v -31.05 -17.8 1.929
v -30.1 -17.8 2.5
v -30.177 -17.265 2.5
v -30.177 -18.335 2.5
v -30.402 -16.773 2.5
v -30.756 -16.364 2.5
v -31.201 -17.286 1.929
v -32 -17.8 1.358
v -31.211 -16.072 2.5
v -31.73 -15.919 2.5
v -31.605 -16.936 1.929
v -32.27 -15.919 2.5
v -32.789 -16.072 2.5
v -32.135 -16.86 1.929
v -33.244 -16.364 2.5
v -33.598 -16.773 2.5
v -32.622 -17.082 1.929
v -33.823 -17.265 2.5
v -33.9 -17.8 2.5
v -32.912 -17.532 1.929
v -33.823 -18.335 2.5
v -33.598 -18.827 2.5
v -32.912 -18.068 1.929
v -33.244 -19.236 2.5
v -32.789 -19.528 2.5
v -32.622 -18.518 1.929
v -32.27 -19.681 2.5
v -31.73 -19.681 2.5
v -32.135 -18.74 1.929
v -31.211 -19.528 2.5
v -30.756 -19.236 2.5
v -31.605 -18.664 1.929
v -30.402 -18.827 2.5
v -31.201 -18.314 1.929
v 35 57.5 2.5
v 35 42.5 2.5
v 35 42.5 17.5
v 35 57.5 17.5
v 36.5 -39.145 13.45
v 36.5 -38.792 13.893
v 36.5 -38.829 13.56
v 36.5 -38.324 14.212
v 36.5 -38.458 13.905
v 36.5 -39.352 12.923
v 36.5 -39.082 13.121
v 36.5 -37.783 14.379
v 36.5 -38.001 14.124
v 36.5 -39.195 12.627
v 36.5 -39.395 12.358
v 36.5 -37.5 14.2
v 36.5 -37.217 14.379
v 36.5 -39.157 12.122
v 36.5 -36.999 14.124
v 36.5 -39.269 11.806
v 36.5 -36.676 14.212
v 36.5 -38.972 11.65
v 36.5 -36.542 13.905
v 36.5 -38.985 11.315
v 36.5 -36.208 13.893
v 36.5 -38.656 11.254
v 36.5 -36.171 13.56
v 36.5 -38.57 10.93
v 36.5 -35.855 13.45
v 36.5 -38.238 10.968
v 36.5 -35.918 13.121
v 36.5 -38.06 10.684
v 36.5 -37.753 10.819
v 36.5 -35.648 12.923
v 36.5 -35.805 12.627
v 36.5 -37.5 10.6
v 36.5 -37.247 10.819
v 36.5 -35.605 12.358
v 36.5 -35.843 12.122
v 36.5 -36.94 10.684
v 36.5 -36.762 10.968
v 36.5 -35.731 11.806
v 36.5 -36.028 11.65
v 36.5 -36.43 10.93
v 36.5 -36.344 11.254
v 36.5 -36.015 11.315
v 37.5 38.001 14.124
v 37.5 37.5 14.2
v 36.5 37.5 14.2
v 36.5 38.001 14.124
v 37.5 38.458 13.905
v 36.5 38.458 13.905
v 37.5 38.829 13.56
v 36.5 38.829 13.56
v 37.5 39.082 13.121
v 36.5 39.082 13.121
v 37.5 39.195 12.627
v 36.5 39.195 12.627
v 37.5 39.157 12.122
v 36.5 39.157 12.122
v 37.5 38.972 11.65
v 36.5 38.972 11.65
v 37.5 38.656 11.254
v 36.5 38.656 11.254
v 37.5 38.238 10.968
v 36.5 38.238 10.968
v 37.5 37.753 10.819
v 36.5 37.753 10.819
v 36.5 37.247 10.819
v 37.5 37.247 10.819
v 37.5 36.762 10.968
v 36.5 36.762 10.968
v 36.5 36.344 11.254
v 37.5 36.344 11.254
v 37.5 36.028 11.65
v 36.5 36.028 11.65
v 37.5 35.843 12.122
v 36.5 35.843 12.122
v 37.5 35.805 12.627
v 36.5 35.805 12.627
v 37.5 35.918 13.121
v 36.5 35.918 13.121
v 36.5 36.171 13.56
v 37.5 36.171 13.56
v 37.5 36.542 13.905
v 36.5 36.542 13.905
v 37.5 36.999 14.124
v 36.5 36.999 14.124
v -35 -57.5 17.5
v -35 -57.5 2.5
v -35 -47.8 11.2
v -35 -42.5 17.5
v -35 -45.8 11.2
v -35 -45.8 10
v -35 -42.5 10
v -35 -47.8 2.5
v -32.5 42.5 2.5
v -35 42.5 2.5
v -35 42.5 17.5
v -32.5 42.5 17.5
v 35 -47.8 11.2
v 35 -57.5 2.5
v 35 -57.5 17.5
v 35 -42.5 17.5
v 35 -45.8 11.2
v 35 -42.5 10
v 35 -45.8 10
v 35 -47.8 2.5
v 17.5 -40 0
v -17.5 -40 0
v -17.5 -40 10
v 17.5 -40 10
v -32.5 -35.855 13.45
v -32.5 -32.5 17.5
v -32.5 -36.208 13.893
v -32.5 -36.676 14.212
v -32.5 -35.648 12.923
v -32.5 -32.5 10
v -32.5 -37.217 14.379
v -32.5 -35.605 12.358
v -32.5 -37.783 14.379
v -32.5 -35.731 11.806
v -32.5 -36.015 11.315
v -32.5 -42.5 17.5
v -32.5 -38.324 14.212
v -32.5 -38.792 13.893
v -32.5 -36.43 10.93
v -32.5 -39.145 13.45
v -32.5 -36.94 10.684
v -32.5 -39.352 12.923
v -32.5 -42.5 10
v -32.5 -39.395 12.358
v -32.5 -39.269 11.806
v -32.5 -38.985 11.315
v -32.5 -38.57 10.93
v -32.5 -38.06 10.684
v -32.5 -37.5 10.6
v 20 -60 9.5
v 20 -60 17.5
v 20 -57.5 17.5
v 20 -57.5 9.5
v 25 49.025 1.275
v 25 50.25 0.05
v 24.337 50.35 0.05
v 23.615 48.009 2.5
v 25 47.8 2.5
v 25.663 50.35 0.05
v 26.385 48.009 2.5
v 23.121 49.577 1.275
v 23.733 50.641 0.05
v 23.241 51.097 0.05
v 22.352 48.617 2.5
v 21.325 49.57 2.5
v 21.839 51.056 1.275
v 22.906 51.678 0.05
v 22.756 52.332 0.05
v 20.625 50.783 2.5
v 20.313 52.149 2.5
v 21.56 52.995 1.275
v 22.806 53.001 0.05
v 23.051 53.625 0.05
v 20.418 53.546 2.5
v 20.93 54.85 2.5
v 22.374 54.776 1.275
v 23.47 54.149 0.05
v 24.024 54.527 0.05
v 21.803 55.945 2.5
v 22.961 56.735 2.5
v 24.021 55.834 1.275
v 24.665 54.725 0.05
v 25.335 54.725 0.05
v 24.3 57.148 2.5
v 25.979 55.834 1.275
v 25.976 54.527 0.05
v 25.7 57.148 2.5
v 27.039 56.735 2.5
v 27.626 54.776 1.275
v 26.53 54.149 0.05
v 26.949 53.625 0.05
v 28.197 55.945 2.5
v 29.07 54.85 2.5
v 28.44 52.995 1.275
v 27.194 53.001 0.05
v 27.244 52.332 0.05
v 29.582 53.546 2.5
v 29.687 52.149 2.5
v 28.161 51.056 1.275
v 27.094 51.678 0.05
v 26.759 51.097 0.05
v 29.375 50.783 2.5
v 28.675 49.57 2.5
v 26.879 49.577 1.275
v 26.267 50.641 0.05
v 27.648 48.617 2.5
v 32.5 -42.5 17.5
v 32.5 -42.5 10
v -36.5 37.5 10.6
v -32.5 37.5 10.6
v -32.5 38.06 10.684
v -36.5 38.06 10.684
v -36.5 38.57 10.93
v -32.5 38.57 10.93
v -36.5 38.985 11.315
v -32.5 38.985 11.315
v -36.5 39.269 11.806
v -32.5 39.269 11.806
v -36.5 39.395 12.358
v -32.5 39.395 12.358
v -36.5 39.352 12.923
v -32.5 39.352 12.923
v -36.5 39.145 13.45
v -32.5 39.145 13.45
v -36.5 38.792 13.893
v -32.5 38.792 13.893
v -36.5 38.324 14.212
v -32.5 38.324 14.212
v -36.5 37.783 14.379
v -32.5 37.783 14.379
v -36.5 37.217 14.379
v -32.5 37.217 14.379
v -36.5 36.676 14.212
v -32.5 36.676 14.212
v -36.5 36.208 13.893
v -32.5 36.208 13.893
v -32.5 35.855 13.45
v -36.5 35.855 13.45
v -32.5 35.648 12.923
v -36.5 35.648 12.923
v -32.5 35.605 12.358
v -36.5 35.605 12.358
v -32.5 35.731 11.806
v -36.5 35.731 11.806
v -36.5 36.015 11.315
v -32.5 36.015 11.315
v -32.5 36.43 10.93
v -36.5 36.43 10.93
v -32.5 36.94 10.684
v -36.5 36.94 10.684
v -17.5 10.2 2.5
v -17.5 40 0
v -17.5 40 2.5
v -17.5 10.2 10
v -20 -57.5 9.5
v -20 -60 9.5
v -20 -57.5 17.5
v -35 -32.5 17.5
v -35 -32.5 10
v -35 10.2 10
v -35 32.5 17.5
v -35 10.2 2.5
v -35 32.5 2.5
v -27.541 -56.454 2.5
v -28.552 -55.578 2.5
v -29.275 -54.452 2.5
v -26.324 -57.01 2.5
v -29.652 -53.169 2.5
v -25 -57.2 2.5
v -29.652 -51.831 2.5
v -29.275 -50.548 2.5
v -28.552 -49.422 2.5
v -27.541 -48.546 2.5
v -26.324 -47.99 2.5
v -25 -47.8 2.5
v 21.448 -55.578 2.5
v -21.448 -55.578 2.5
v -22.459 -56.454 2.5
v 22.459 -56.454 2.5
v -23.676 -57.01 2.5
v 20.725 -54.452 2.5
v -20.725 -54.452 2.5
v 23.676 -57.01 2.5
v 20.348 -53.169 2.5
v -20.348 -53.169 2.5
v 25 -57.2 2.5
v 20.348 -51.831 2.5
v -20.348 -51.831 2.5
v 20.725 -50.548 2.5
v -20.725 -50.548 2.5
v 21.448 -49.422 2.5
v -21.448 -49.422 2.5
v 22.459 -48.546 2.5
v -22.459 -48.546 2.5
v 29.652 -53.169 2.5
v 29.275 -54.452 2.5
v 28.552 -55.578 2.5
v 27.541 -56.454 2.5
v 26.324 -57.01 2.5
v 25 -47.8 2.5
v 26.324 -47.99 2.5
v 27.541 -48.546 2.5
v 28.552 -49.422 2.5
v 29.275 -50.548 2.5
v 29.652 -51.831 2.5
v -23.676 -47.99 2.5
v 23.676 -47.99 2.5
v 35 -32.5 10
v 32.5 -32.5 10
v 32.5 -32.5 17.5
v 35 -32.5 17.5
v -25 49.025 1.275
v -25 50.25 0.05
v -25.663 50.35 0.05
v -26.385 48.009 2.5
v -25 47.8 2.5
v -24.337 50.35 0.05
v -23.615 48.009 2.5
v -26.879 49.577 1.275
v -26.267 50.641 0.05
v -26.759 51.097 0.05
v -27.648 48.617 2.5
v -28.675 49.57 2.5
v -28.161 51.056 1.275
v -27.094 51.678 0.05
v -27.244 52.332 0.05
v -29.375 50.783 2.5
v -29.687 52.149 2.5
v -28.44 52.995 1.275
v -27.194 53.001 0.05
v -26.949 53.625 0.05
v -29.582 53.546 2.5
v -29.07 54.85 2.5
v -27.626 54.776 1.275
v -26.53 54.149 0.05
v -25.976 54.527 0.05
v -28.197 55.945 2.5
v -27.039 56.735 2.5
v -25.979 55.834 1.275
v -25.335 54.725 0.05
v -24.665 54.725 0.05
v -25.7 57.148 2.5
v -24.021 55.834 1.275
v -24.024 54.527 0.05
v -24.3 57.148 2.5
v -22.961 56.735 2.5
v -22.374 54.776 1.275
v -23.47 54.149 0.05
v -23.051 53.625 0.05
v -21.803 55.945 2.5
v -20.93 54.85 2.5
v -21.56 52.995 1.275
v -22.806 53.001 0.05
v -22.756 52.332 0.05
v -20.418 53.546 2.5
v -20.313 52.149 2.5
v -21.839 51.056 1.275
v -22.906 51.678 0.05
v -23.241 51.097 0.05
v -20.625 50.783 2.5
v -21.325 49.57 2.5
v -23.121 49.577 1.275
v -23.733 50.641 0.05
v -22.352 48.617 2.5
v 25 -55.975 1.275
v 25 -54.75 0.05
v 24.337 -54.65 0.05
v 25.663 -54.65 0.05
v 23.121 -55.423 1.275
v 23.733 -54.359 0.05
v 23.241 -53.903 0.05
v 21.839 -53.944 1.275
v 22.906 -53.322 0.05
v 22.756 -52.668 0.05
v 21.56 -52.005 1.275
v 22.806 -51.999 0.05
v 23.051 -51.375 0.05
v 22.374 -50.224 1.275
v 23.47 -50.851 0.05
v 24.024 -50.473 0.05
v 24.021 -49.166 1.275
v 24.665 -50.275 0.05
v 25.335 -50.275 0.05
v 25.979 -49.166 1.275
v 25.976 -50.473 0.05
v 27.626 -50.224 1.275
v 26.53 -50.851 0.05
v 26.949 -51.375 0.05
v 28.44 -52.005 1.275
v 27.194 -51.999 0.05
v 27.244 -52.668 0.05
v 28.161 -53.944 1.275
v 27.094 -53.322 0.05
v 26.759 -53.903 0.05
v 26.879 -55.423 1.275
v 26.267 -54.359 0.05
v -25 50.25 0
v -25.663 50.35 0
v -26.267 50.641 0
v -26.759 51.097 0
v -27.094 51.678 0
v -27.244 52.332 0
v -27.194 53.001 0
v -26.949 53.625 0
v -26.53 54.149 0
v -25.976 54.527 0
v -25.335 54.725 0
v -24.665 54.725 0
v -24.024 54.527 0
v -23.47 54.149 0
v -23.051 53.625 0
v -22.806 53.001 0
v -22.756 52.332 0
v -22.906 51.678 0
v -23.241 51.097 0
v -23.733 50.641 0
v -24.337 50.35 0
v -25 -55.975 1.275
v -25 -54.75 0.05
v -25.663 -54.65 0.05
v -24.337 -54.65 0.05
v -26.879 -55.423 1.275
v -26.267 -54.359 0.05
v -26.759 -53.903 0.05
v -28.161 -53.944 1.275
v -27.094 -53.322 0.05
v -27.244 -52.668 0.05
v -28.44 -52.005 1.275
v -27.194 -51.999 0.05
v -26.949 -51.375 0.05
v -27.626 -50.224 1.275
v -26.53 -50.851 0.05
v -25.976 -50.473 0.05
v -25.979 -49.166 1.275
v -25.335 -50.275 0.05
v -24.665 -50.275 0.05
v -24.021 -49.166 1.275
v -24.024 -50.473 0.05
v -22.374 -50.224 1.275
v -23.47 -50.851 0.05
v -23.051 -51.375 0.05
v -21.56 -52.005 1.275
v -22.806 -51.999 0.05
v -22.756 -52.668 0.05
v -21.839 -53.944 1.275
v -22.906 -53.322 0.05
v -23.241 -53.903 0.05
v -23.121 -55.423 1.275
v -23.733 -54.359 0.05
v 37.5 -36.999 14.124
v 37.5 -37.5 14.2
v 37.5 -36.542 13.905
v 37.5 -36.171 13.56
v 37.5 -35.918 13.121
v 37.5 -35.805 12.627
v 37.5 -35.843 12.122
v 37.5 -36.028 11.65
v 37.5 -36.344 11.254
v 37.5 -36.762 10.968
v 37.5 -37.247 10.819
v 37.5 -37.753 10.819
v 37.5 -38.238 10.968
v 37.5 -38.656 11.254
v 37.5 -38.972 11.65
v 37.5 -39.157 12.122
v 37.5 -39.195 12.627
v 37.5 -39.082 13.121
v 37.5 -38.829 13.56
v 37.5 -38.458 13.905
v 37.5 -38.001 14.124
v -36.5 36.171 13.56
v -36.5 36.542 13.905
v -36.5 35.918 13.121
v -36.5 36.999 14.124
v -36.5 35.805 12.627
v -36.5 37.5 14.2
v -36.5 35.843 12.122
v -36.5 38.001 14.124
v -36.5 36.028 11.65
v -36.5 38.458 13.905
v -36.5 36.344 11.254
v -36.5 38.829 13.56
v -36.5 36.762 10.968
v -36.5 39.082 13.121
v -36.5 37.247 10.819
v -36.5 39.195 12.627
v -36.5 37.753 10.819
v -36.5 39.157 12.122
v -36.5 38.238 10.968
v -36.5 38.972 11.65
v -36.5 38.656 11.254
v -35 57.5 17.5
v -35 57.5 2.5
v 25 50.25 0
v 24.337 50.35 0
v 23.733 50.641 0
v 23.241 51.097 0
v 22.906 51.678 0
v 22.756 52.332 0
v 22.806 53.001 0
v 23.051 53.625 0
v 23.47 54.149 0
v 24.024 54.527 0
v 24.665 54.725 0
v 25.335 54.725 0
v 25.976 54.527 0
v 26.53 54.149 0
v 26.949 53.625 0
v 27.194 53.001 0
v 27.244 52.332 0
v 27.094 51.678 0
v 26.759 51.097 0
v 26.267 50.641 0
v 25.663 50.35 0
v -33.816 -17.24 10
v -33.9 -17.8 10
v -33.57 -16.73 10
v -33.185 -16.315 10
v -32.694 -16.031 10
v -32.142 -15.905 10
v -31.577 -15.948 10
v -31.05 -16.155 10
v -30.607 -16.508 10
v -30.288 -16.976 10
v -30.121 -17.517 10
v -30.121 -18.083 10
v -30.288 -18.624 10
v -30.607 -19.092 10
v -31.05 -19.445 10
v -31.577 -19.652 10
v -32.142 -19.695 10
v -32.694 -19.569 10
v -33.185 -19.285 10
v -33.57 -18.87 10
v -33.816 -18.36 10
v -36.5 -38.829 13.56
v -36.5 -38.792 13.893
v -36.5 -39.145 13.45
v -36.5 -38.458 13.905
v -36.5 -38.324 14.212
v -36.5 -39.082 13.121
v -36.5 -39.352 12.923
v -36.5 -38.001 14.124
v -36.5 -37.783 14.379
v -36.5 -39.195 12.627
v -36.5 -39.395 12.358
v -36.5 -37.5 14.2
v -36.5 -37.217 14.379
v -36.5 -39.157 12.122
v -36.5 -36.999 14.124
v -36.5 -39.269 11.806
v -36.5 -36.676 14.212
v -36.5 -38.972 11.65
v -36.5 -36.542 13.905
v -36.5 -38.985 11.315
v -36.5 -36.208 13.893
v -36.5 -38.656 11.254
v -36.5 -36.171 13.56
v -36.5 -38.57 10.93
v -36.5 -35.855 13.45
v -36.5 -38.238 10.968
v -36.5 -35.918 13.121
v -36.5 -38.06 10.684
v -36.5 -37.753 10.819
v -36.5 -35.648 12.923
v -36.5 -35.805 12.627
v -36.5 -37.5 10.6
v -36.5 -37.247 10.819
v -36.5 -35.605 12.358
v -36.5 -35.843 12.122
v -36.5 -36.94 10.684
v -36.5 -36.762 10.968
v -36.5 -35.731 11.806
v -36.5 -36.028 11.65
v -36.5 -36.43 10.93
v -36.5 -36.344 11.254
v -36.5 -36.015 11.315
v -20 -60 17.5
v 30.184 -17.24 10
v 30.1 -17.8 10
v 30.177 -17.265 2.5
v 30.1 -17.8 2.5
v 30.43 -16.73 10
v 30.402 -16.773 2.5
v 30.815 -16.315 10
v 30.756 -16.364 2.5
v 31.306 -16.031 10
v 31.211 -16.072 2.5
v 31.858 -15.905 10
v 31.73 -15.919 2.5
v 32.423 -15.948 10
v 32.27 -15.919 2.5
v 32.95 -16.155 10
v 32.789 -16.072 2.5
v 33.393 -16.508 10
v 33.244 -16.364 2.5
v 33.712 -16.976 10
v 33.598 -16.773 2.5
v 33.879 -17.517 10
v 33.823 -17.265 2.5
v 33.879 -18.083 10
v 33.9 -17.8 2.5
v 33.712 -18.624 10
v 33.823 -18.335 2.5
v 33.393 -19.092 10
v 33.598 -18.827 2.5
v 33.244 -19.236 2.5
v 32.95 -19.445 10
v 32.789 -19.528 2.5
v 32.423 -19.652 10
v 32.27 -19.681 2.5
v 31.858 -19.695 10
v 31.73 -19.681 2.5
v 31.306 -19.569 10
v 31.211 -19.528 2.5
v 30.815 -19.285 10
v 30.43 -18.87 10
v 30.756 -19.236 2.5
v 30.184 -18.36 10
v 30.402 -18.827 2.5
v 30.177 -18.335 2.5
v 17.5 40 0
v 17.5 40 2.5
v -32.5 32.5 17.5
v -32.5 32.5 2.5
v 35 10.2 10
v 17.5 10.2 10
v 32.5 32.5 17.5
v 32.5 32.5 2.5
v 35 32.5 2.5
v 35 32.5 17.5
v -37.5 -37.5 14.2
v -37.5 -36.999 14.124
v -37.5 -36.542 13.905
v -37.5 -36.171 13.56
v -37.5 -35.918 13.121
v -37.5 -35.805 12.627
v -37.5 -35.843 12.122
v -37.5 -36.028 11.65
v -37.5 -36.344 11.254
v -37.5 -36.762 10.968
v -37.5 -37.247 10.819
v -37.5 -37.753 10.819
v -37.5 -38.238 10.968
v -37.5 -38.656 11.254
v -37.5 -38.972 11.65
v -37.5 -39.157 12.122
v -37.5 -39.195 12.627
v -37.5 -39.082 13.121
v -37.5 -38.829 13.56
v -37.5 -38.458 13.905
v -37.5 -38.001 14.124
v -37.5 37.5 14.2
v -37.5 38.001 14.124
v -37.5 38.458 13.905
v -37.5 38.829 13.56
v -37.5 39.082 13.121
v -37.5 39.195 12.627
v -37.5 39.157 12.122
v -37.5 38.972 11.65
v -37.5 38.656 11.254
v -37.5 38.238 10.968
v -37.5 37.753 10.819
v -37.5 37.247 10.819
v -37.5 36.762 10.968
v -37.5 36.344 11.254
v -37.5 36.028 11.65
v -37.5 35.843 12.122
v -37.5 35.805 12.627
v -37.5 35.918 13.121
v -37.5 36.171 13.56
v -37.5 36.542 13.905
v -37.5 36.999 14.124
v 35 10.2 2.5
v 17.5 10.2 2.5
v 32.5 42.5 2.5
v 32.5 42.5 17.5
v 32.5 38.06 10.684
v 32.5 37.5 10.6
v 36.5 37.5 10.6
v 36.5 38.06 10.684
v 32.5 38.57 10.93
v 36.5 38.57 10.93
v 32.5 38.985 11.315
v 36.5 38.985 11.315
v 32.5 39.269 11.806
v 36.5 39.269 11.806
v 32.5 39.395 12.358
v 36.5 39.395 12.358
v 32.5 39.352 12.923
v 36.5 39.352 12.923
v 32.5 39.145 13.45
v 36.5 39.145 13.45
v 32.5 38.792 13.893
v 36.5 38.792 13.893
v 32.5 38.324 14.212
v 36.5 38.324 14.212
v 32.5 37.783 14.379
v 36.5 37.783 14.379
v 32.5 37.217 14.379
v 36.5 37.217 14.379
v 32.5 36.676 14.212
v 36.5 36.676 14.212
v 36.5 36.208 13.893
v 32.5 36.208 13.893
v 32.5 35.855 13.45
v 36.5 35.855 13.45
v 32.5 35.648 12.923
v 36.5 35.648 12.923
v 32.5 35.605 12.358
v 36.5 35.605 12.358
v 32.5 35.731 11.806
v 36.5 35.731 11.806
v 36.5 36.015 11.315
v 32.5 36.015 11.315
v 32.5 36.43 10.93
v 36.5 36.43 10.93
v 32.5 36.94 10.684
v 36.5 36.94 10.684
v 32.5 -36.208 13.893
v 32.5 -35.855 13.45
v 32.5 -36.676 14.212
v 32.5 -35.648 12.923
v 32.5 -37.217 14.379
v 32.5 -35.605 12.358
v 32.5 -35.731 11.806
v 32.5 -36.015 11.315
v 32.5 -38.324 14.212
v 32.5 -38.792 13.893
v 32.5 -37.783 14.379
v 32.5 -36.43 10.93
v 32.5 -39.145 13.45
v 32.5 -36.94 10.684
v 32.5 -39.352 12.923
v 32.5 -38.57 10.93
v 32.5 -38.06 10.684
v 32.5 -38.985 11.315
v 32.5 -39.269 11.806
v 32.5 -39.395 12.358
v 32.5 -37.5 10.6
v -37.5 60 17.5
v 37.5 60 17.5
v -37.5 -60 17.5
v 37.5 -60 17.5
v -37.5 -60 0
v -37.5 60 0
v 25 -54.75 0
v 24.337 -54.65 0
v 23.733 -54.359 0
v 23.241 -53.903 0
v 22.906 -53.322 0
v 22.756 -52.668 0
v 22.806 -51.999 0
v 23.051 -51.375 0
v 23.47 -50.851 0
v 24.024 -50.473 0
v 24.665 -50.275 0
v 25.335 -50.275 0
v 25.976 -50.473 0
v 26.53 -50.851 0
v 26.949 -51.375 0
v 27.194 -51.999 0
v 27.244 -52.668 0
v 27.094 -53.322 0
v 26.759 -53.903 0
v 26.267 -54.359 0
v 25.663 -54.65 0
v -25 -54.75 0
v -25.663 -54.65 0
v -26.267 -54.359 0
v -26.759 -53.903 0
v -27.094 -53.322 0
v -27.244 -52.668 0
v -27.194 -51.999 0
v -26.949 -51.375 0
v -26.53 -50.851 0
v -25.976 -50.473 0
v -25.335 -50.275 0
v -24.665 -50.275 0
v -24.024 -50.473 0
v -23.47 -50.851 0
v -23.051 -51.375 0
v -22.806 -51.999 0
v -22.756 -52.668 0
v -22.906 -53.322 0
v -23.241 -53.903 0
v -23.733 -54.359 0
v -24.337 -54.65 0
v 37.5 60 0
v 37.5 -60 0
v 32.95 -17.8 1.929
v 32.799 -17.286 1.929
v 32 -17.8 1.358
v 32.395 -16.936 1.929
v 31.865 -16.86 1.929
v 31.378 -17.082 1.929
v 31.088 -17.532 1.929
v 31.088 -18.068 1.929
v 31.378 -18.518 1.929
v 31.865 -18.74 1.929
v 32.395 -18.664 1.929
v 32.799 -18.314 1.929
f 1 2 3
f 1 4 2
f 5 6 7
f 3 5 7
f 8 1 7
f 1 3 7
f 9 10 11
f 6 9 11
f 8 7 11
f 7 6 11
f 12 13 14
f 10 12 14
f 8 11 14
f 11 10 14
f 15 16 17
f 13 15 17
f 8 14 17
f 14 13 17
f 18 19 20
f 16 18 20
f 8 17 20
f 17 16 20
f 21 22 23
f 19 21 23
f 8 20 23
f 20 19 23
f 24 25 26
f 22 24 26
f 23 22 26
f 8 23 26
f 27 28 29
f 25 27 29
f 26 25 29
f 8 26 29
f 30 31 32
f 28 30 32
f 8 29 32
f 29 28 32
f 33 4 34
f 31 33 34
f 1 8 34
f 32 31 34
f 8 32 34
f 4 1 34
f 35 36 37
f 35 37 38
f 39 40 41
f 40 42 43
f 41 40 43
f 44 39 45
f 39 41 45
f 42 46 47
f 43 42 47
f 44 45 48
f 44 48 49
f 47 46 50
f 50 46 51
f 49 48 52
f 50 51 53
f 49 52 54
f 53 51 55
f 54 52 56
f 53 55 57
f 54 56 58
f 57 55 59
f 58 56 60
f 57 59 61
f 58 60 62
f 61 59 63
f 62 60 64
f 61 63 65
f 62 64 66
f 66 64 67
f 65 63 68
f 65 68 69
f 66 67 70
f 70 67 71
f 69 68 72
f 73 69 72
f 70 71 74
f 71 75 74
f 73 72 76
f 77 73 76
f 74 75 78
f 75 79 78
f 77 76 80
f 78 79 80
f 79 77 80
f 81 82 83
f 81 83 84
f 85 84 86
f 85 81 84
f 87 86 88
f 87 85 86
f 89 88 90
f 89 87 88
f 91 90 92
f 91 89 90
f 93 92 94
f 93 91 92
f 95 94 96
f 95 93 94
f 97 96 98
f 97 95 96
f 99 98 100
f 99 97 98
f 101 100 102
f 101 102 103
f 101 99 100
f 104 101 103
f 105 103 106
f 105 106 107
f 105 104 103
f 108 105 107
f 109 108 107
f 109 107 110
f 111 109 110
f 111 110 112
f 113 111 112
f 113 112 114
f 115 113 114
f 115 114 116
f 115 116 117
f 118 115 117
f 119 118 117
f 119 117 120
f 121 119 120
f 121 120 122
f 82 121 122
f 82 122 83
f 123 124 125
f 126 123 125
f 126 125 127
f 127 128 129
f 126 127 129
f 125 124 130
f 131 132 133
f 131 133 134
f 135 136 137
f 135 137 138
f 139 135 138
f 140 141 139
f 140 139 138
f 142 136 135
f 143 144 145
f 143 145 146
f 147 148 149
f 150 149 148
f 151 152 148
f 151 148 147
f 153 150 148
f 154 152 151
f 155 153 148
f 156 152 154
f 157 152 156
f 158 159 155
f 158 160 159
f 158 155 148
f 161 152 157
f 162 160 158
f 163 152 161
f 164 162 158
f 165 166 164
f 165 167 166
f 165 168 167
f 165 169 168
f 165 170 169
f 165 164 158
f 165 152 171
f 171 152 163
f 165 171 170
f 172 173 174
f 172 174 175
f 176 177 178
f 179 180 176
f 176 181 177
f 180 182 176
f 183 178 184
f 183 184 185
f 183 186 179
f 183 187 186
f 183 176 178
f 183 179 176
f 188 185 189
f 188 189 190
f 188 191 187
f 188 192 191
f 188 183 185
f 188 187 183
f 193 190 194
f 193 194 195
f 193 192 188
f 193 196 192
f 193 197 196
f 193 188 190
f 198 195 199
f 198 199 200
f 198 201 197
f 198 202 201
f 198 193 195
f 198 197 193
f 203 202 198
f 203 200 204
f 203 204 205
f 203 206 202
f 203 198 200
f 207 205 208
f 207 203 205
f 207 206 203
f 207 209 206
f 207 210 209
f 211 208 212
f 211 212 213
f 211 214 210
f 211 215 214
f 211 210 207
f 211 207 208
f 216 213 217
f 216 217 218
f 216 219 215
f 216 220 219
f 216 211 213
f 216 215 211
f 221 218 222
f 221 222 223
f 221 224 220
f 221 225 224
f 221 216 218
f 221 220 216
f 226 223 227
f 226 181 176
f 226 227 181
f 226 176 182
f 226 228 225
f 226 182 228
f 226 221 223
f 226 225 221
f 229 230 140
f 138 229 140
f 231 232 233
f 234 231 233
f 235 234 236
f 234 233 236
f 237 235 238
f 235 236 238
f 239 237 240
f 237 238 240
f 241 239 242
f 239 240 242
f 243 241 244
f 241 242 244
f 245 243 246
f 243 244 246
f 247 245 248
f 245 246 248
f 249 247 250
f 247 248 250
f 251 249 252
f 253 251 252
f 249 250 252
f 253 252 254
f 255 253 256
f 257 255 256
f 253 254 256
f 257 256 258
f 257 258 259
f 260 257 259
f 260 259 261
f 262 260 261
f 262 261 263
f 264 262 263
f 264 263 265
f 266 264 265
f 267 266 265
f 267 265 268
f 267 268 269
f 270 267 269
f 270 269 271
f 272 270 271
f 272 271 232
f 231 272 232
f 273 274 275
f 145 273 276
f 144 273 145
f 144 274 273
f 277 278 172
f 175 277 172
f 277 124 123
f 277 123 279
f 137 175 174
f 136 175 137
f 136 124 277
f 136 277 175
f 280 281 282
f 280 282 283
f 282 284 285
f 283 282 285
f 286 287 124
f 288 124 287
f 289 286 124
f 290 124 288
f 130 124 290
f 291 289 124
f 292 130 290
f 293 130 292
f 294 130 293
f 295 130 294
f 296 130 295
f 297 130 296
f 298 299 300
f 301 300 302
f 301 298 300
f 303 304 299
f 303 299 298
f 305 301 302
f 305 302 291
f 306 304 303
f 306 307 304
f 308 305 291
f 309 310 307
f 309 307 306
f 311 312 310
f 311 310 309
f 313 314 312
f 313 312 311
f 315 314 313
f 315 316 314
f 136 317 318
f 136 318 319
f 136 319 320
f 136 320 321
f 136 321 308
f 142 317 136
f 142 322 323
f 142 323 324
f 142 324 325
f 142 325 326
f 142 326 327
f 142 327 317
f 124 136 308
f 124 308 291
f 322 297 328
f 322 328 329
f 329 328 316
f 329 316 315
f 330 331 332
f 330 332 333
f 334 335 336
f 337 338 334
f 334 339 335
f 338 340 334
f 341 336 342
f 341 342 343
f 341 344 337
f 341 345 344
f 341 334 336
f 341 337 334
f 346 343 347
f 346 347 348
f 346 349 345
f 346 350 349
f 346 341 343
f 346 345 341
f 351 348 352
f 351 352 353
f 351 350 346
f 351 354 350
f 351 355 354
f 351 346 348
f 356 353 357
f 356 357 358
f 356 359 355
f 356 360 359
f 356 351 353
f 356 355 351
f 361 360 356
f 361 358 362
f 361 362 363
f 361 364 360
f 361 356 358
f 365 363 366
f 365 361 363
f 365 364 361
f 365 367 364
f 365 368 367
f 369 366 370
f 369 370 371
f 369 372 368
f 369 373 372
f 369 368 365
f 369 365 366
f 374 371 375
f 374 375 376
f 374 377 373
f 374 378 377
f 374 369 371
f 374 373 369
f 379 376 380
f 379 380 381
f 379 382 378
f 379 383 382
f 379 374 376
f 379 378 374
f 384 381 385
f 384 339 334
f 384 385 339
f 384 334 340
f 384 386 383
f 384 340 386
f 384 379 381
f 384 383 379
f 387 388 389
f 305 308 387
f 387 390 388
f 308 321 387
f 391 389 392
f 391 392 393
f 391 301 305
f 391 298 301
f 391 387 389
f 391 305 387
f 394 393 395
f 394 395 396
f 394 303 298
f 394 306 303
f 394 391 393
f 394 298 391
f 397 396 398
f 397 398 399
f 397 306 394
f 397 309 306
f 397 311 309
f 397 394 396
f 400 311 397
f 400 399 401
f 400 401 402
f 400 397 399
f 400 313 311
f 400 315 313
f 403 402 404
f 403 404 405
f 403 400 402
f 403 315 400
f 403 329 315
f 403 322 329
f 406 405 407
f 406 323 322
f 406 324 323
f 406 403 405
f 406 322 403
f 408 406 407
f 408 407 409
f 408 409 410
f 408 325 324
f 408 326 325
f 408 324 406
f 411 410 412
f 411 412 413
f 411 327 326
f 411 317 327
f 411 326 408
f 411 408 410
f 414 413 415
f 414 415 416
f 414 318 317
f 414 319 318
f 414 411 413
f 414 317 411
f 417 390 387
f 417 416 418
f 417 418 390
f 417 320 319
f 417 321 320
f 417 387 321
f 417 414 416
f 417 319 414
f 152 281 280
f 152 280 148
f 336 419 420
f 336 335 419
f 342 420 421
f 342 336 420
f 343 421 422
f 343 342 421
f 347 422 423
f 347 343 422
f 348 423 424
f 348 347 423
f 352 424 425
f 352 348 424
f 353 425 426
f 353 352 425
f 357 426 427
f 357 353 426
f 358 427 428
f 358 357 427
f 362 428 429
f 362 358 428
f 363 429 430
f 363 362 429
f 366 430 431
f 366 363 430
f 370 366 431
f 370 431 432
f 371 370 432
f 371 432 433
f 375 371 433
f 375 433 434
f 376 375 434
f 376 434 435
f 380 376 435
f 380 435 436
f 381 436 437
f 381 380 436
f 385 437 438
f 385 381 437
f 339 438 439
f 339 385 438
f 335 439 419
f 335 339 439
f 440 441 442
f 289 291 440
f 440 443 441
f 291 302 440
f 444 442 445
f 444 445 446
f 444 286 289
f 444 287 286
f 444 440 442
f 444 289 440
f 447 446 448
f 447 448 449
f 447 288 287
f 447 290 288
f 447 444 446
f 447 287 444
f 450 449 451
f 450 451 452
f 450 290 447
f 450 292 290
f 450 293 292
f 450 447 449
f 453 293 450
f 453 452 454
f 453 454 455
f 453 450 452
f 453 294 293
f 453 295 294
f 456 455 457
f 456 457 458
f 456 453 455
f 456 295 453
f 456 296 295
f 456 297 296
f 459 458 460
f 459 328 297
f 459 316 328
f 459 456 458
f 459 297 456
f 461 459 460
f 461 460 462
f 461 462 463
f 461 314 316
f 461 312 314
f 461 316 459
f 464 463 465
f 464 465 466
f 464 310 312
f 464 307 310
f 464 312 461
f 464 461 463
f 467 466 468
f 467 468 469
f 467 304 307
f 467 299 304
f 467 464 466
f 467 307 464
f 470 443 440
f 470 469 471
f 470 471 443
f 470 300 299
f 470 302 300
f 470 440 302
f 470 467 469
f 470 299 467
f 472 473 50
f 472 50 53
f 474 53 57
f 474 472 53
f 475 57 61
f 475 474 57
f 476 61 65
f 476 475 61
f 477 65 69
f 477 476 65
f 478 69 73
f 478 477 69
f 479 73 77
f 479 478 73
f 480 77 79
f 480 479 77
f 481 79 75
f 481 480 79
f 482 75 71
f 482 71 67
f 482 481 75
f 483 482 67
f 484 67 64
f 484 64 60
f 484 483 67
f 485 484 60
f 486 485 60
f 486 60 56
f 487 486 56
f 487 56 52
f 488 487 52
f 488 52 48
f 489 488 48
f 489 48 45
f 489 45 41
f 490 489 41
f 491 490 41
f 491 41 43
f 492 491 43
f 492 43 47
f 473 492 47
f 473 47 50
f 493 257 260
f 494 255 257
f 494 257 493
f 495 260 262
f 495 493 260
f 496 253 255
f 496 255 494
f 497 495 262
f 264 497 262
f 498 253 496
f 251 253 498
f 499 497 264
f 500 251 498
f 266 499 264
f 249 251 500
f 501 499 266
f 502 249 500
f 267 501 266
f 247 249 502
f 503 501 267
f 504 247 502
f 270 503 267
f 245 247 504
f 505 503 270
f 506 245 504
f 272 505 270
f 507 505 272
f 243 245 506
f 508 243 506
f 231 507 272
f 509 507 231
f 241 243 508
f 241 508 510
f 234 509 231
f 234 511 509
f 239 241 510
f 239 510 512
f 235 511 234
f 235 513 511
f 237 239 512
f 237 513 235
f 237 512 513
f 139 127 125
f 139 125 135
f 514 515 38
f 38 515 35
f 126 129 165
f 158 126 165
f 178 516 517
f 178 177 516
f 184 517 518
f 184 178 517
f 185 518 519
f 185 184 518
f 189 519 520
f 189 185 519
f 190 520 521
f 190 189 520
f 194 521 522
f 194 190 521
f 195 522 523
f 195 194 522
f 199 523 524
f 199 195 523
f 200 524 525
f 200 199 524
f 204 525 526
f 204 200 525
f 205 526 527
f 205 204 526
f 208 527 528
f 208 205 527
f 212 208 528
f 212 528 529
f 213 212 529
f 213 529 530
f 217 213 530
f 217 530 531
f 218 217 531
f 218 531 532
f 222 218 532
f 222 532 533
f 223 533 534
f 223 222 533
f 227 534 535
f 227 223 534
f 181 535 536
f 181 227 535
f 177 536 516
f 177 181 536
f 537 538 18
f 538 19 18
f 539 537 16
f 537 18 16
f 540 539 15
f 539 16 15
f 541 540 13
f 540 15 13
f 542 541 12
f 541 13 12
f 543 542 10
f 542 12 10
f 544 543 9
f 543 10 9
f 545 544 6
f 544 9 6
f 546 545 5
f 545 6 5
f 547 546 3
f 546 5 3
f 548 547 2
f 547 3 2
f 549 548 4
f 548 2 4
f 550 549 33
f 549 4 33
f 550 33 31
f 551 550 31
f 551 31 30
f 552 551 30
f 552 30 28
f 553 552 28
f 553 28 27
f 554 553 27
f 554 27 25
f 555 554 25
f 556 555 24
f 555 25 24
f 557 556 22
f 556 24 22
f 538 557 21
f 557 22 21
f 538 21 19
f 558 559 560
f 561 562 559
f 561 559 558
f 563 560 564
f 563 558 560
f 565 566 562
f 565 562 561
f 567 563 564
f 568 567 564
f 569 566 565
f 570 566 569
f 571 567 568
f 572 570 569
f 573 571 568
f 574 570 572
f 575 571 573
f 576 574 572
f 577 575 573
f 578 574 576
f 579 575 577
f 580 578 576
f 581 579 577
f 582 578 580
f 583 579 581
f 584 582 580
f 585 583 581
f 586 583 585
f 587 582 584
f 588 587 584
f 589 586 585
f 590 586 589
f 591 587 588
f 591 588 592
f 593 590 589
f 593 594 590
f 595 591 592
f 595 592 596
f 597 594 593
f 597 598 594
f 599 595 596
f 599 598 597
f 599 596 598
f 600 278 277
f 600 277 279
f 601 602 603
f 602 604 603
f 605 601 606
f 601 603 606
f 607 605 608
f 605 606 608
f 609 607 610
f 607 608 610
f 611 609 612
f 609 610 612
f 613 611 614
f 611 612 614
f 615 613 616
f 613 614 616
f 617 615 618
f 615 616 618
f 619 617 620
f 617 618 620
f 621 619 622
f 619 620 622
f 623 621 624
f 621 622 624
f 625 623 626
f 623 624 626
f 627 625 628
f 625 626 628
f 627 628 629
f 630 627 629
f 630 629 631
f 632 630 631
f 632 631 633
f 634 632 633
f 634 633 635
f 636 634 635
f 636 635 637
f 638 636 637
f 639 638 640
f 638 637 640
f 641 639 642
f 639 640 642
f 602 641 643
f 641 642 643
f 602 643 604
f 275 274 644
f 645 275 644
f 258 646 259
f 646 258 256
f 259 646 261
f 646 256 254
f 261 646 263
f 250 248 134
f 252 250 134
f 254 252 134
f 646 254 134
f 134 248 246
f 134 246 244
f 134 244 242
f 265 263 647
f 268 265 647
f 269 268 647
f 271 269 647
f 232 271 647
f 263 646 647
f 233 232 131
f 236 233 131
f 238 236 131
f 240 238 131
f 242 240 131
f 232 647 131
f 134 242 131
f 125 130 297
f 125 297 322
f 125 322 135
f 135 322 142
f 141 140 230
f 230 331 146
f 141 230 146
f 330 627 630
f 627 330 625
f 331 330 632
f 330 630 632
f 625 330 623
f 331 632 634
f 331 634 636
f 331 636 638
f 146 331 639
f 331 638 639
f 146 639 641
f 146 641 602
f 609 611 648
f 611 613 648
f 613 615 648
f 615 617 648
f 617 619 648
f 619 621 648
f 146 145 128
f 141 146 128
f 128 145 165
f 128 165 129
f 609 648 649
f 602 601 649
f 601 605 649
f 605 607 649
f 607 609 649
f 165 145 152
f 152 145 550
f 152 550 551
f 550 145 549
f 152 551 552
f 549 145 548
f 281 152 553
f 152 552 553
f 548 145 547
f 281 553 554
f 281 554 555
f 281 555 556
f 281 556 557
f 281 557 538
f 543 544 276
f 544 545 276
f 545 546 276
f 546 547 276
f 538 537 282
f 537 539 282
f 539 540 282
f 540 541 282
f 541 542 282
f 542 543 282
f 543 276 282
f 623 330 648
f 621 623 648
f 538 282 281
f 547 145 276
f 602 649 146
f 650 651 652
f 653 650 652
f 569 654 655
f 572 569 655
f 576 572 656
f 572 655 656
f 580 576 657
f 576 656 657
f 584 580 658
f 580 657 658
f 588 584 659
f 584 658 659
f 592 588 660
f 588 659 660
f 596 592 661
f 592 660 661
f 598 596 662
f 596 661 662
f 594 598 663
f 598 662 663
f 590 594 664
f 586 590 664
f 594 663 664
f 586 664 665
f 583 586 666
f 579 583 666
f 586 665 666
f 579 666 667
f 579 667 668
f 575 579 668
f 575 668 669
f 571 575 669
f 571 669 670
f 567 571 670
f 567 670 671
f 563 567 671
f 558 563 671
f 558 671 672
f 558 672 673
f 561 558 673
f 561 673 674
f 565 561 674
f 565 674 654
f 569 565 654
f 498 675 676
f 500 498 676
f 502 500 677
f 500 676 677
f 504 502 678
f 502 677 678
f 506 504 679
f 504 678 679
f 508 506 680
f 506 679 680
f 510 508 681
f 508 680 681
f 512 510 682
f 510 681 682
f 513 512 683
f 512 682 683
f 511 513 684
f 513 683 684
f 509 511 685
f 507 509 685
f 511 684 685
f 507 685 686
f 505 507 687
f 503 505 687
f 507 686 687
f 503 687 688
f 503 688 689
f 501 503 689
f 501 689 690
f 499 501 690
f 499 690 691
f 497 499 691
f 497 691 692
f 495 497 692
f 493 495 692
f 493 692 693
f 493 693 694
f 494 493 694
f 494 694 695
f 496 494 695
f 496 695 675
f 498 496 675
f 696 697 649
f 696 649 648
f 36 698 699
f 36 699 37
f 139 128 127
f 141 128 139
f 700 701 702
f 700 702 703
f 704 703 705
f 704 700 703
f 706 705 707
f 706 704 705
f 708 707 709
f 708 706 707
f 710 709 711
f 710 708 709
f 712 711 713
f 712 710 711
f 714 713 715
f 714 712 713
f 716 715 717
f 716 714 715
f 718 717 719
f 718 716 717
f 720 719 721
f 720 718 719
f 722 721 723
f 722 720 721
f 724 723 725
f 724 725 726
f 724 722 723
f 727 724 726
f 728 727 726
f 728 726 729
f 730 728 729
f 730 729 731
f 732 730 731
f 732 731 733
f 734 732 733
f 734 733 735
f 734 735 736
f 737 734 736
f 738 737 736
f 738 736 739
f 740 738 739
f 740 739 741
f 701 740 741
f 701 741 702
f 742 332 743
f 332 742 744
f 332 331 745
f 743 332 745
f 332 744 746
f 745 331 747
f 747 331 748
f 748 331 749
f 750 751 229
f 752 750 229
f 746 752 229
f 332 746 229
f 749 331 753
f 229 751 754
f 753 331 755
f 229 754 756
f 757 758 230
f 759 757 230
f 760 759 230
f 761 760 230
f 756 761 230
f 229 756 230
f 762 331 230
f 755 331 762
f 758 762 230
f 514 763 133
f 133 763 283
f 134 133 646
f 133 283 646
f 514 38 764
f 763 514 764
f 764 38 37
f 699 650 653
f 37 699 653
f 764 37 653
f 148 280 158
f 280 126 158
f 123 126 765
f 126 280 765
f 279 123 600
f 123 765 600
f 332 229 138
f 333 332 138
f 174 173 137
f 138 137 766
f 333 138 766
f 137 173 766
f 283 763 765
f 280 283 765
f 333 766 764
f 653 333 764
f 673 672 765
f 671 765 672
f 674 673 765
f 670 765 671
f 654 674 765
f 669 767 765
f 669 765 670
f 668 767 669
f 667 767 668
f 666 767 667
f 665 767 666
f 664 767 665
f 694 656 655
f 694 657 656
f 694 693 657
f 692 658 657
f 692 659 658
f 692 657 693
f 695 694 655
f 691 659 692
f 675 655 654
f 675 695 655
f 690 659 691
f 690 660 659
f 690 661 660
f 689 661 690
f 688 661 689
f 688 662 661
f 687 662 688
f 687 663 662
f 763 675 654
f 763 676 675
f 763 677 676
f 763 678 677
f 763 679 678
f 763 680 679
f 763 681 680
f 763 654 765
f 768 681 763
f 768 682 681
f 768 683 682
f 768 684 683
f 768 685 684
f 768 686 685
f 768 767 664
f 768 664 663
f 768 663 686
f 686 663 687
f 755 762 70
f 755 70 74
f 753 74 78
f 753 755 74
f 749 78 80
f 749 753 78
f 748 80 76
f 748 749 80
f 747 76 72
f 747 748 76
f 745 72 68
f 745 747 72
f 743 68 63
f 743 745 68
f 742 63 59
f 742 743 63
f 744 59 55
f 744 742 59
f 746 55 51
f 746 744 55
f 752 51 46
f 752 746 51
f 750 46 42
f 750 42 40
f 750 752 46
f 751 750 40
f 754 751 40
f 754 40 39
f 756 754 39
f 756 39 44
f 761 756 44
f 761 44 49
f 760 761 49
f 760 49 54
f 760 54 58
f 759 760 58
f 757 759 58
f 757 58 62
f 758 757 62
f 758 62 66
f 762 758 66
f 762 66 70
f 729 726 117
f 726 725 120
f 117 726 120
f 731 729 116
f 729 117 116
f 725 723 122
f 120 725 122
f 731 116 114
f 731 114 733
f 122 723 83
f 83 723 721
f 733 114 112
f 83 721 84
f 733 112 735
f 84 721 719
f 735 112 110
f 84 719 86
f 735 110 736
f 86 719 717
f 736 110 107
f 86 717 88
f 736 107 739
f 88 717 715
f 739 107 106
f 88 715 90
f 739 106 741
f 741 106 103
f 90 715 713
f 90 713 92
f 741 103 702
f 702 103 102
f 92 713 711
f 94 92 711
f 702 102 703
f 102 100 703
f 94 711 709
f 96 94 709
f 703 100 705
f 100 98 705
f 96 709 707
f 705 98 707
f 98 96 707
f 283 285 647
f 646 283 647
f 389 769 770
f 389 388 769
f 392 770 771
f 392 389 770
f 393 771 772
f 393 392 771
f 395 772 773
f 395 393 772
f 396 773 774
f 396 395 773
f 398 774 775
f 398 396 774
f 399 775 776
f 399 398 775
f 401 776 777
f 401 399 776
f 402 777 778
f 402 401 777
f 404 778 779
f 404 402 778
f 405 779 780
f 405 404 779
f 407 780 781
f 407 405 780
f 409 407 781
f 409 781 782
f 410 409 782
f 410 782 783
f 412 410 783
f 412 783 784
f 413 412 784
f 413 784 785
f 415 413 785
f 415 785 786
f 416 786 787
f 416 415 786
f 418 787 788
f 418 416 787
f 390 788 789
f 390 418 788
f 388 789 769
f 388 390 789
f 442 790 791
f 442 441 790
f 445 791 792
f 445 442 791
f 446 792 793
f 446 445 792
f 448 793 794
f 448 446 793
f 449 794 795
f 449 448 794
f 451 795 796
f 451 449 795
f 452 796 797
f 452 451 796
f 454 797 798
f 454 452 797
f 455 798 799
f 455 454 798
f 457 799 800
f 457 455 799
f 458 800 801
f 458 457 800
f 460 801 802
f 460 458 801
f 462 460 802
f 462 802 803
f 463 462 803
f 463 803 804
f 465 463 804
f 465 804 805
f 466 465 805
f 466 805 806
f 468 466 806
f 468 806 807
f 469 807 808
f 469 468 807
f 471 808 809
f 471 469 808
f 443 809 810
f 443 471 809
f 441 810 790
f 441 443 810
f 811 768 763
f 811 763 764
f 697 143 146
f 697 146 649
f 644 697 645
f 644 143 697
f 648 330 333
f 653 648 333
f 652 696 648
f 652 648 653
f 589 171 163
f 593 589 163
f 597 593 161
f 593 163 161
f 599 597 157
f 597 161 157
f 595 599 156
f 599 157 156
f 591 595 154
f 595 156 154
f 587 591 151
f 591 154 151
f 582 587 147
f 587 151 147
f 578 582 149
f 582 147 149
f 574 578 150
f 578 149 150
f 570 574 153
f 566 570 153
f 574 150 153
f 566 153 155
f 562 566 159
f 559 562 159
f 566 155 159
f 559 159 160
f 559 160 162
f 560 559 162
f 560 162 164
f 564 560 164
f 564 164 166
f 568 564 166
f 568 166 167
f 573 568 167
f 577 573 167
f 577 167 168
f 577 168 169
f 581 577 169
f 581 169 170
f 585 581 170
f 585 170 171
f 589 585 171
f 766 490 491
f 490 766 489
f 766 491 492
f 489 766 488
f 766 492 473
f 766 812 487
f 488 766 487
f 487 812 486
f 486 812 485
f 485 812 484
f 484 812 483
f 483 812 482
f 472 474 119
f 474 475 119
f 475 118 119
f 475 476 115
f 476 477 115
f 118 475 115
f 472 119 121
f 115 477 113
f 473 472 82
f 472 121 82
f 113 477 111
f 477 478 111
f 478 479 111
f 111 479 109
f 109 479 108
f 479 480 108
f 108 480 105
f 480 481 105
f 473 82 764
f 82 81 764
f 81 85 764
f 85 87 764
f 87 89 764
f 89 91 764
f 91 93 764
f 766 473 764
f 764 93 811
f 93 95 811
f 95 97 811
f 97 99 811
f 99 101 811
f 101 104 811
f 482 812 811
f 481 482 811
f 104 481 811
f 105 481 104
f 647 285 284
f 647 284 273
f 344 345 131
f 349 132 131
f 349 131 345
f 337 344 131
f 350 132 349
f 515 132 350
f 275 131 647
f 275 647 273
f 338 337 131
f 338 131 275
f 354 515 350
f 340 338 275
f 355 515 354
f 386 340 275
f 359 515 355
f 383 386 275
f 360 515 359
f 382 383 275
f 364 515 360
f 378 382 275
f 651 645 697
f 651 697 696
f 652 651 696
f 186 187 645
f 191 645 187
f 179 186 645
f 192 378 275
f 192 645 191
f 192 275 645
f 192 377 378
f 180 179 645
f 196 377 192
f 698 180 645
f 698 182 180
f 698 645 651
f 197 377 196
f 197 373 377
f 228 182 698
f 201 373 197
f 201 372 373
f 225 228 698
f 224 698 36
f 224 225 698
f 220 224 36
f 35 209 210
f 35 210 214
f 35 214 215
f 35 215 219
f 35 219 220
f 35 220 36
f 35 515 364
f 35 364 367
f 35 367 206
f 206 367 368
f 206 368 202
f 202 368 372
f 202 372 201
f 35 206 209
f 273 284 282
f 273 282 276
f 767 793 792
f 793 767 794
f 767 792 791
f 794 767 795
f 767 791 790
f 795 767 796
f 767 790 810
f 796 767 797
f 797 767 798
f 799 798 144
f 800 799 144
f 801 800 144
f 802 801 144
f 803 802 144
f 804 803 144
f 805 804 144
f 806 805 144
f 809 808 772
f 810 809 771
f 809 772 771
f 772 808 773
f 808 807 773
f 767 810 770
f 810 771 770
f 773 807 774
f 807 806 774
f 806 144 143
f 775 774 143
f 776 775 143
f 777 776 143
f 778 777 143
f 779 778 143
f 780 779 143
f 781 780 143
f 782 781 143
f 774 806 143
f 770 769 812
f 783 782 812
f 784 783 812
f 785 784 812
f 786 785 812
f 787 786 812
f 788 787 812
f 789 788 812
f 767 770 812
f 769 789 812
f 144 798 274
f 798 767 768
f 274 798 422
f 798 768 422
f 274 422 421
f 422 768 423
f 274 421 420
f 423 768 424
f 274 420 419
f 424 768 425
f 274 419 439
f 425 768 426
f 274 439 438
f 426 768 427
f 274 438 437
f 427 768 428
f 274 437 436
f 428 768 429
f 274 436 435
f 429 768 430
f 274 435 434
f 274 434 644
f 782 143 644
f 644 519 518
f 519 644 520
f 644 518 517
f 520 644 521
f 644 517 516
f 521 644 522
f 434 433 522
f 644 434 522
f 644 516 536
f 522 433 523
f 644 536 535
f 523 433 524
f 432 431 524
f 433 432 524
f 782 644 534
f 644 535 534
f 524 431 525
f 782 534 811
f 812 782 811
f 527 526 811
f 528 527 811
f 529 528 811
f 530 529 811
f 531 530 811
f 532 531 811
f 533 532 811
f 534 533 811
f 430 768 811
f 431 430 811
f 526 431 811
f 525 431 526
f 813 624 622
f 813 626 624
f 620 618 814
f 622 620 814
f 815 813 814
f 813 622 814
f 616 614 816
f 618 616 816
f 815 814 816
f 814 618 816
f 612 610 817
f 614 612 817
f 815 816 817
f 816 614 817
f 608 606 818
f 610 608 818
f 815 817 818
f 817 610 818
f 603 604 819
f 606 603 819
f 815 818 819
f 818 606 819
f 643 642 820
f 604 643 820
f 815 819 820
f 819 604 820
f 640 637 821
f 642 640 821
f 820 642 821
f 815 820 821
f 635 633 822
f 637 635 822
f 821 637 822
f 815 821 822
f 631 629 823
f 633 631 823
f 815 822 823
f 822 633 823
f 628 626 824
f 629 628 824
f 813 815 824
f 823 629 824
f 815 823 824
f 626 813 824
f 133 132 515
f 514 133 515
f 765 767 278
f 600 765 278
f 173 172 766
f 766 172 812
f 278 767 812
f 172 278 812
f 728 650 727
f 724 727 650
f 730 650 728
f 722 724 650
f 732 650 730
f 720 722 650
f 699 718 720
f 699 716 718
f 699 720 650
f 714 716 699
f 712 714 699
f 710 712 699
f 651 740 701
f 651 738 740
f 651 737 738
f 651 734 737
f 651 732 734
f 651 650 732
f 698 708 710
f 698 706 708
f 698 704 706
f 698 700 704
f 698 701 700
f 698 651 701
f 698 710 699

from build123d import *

# Parameters (mm, degrees)
SKICA1_W                                          = 75
SKICA1_H                                          = 120
SKICA1_W_2                                        = 35
SKICA1_H_2                                        = 80
P_IDAT_VYSUNUT_M1_DEPTH                           = 2.5
SKICA2_W                                          = 75
SKICA2_H                                          = 120
SKICA2_W_2                                        = 70
SKICA2_H_2                                        = 115
P_IDAT_VYSUNUT_M2_DEPTH                           = 15
KU_ELOV_ZAHLOUBEN_PRO_M4_ROUBU_SE_2_COUNT         = 2
KU_ELOV_ZAHLOUBEN_PRO_M4_ROUBU_SE_2_PITCH         = 50
KU_ELOV_ZAHLOUBEN_PRO_M4_ROUBU_SE_3_COUNT         = 2
KU_ELOV_ZAHLOUBEN_PRO_M4_ROUBU_SE_3_PITCH         = 105
KU_ELOV_ZAHLOUBEN_PRO_M4_ROUBU_SE_4_COUNT         = 2
KU_ELOV_ZAHLOUBEN_PRO_M4_ROUBU_SE_4_PITCH         = 116.297033496
ODEBRAT_VYSUNUT_M4_DEPTH                          = 10
P_IDAT_VYSUNUT_M3_DEPTH                           = 7.5
SKICA22_W                                         = 70
SKICA22_H                                         = 2
P_IDAT_VYSUNUT_M4_DEPTH                           = 1.2
D_RY_PRO_KOL_K_VELIKOST_MM1_D                     = 3.8
D_RY_PRO_KOL_K_VELIKOST_MM1_DEPTH                 = 7.5
D_RY_PRO_KOL_K_VELIKOST_MM1_TIP                   = 1.141635176
SKICA27_W                                         = 2.5
SKICA27_H                                         = 10
P_IDAT_VYSUNUT_M5_DEPTH                           = 15
V_LCOV_ZAHLOUBEN_PRO_M3_ROUBY_S_K_NIC_D           = 3.4
V_LCOV_ZAHLOUBEN_PRO_M3_ROUBY_S_K_NIC_DEPTH       = 5
V_LCOV_ZAHLOUBEN_PRO_M3_ROUBY_S_K_NIC_CBORE_D     = 3.8
V_LCOV_ZAHLOUBEN_PRO_M3_ROUBY_S_K_NIC_CBORE_DEPTH = 4


with BuildPart() as part:
    # Skica1 → Přidat vysunutím1 (new body)
    with BuildSketch(Plane.XY):
        Rectangle(SKICA1_W, SKICA1_H)
        Rectangle(SKICA1_W_2, SKICA1_H_2, mode=Mode.SUBTRACT)
    extrude(amount=P_IDAT_VYSUNUT_M1_DEPTH)

    # Skica2 → Přidat vysunutím2 (add)
    with BuildSketch(Plane.XY.offset(2.5)):
        Rectangle(SKICA2_W, SKICA2_H)
        Rectangle(SKICA2_W_2, SKICA2_H_2, mode=Mode.SUBTRACT)
    extrude(amount=P_IDAT_VYSUNUT_M2_DEPTH)

    # Skica15 → Kuželové zahloubení pro M4 šroubu se zápustnou hlavou plochou2 (revolve, cut)
    with BuildSketch(Plane(origin=(25, 52.5, 2.5), x_dir=(0, -1, 0), z_dir=(1, 0, 0))):
        Polygon((0, 0), (0, 2.5), (2.25, 2.5), (2.25, 2.45), (4.7, 0), align=None)
    ku_elov_zahlouben_pro_m4_roubu_se_z_p = revolve(axis=Axis((25, 52.5, 8.85), (0, 0, -1)), mode=Mode.SUBTRACT)

    # Ku_elov_ zahlouben_ pro M4 _roubu se 2: Kuželové zahloubení pro M4 šroubu se zápustnou hlavou plochou2 ×2
    with Locations(*[(-i * KU_ELOV_ZAHLOUBEN_PRO_M4_ROUBU_SE_2_PITCH, 0, 0) for i in range(1, KU_ELOV_ZAHLOUBEN_PRO_M4_ROUBU_SE_2_COUNT)]):
        add(ku_elov_zahlouben_pro_m4_roubu_se_z_p, mode=Mode.SUBTRACT)

    # Ku_elov_ zahlouben_ pro M4 _roubu se 3: Kuželové zahloubení pro M4 šroubu se zápustnou hlavou plochou2 ×2
    with Locations(*[(0, -i * KU_ELOV_ZAHLOUBEN_PRO_M4_ROUBU_SE_3_PITCH, 0) for i in range(1, KU_ELOV_ZAHLOUBEN_PRO_M4_ROUBU_SE_3_COUNT)]):
        add(ku_elov_zahlouben_pro_m4_roubu_se_z_p, mode=Mode.SUBTRACT)

    # Ku_elov_ zahlouben_ pro M4 _roubu se 4: Kuželové zahloubení pro M4 šroubu se zápustnou hlavou plochou2 ×2
    with Locations(*[Vector(-0.42993358039234786, -0.9028605188239304, 0) * (i * KU_ELOV_ZAHLOUBEN_PRO_M4_ROUBU_SE_4_PITCH) for i in range(1, KU_ELOV_ZAHLOUBEN_PRO_M4_ROUBU_SE_4_COUNT)]):
        add(ku_elov_zahlouben_pro_m4_roubu_se_z_p, mode=Mode.SUBTRACT)

    # Skica20 → Odebrat vysunutím4 (cut)
    with BuildSketch(Plane.XZ.offset(60)):
        Polygon((0, 9.5), (-20, 9.5), (-20, 17.5), (20, 17.5), (20, 9.5), align=None)
    extrude(amount=-ODEBRAT_VYSUNUT_M4_DEPTH, mode=Mode.SUBTRACT)

    # Skica21 → Přidat vysunutím3 (add)
    with BuildSketch(Plane.XY.offset(2.5)):
        Polygon((35, -47.8), (-35, -47.8), (-35, 10.2), (-17.5, 10.2), (-17.5, -40), (17.5, -40), (17.5, 10.2), (35, 10.2), align=None)
    extrude(amount=P_IDAT_VYSUNUT_M3_DEPTH)

    # Skica22 → Přidat vysunutím4 (add)
    with BuildSketch(Plane.XY.offset(10)):
        with Locations((0, -46.8)):
            Rectangle(SKICA22_W, SKICA22_H)
    extrude(amount=P_IDAT_VYSUNUT_M4_DEPTH)

    # Díry pro kolík, velikost mm1
    with Locations(Plane.XY.offset(10)):
        with Locations((32, -17.8), (-32, -17.8)):
            Hole(D_RY_PRO_KOL_K_VELIKOST_MM1_D / 2, depth=D_RY_PRO_KOL_K_VELIKOST_MM1_DEPTH)
            with Locations((0, 0, -(D_RY_PRO_KOL_K_VELIKOST_MM1_DEPTH + D_RY_PRO_KOL_K_VELIKOST_MM1_TIP / 2))):  # 118° drill point
                Cone(0, D_RY_PRO_KOL_K_VELIKOST_MM1_D / 2, D_RY_PRO_KOL_K_VELIKOST_MM1_TIP, mode=Mode.SUBTRACT)

    # Skica27 → Přidat vysunutím5 (add)
    with BuildSketch(Plane.XY.offset(2.5)):
        with Locations((33.75, 37.5)):
            Rectangle(SKICA27_W, SKICA27_H)
        with Locations((-33.75, 37.5)):
            Rectangle(SKICA27_W, SKICA27_H)
    p_idat_vysunut_m5 = extrude(amount=P_IDAT_VYSUNUT_M5_DEPTH)

    # Zrcadlit1: Přidat vysunutím5 across plane
    add(p_idat_vysunut_m5.mirror(Plane.ZX))

    # Válcové zahloubení pro M3 šrouby s kónickou hlavou1
    with Locations(Plane(origin=(-32.5, 0, 0), x_dir=(0, 0, -1), z_dir=(1, 0, 0))):
        with Locations((-12.5, -37.5), (-12.5, 37.5)):
            v_lcov_zahlouben_pro_m3_rouby_s_k_nic = CounterBoreHole(V_LCOV_ZAHLOUBEN_PRO_M3_ROUBY_S_K_NIC_D / 2, V_LCOV_ZAHLOUBEN_PRO_M3_ROUBY_S_K_NIC_CBORE_D / 2, V_LCOV_ZAHLOUBEN_PRO_M3_ROUBY_S_K_NIC_CBORE_DEPTH, depth=V_LCOV_ZAHLOUBEN_PRO_M3_ROUBY_S_K_NIC_DEPTH)

    # Zrcadlit2: Válcové zahloubení pro M3 šrouby s kónickou hlavou1 across plane
    add(v_lcov_zahlouben_pro_m3_rouby_s_k_nic.mirror(Plane(origin=(0, 0, 0), x_dir=(0, 0, 1), z_dir=(1, 0, 0))), mode=Mode.SUBTRACT)


solid = part.part
